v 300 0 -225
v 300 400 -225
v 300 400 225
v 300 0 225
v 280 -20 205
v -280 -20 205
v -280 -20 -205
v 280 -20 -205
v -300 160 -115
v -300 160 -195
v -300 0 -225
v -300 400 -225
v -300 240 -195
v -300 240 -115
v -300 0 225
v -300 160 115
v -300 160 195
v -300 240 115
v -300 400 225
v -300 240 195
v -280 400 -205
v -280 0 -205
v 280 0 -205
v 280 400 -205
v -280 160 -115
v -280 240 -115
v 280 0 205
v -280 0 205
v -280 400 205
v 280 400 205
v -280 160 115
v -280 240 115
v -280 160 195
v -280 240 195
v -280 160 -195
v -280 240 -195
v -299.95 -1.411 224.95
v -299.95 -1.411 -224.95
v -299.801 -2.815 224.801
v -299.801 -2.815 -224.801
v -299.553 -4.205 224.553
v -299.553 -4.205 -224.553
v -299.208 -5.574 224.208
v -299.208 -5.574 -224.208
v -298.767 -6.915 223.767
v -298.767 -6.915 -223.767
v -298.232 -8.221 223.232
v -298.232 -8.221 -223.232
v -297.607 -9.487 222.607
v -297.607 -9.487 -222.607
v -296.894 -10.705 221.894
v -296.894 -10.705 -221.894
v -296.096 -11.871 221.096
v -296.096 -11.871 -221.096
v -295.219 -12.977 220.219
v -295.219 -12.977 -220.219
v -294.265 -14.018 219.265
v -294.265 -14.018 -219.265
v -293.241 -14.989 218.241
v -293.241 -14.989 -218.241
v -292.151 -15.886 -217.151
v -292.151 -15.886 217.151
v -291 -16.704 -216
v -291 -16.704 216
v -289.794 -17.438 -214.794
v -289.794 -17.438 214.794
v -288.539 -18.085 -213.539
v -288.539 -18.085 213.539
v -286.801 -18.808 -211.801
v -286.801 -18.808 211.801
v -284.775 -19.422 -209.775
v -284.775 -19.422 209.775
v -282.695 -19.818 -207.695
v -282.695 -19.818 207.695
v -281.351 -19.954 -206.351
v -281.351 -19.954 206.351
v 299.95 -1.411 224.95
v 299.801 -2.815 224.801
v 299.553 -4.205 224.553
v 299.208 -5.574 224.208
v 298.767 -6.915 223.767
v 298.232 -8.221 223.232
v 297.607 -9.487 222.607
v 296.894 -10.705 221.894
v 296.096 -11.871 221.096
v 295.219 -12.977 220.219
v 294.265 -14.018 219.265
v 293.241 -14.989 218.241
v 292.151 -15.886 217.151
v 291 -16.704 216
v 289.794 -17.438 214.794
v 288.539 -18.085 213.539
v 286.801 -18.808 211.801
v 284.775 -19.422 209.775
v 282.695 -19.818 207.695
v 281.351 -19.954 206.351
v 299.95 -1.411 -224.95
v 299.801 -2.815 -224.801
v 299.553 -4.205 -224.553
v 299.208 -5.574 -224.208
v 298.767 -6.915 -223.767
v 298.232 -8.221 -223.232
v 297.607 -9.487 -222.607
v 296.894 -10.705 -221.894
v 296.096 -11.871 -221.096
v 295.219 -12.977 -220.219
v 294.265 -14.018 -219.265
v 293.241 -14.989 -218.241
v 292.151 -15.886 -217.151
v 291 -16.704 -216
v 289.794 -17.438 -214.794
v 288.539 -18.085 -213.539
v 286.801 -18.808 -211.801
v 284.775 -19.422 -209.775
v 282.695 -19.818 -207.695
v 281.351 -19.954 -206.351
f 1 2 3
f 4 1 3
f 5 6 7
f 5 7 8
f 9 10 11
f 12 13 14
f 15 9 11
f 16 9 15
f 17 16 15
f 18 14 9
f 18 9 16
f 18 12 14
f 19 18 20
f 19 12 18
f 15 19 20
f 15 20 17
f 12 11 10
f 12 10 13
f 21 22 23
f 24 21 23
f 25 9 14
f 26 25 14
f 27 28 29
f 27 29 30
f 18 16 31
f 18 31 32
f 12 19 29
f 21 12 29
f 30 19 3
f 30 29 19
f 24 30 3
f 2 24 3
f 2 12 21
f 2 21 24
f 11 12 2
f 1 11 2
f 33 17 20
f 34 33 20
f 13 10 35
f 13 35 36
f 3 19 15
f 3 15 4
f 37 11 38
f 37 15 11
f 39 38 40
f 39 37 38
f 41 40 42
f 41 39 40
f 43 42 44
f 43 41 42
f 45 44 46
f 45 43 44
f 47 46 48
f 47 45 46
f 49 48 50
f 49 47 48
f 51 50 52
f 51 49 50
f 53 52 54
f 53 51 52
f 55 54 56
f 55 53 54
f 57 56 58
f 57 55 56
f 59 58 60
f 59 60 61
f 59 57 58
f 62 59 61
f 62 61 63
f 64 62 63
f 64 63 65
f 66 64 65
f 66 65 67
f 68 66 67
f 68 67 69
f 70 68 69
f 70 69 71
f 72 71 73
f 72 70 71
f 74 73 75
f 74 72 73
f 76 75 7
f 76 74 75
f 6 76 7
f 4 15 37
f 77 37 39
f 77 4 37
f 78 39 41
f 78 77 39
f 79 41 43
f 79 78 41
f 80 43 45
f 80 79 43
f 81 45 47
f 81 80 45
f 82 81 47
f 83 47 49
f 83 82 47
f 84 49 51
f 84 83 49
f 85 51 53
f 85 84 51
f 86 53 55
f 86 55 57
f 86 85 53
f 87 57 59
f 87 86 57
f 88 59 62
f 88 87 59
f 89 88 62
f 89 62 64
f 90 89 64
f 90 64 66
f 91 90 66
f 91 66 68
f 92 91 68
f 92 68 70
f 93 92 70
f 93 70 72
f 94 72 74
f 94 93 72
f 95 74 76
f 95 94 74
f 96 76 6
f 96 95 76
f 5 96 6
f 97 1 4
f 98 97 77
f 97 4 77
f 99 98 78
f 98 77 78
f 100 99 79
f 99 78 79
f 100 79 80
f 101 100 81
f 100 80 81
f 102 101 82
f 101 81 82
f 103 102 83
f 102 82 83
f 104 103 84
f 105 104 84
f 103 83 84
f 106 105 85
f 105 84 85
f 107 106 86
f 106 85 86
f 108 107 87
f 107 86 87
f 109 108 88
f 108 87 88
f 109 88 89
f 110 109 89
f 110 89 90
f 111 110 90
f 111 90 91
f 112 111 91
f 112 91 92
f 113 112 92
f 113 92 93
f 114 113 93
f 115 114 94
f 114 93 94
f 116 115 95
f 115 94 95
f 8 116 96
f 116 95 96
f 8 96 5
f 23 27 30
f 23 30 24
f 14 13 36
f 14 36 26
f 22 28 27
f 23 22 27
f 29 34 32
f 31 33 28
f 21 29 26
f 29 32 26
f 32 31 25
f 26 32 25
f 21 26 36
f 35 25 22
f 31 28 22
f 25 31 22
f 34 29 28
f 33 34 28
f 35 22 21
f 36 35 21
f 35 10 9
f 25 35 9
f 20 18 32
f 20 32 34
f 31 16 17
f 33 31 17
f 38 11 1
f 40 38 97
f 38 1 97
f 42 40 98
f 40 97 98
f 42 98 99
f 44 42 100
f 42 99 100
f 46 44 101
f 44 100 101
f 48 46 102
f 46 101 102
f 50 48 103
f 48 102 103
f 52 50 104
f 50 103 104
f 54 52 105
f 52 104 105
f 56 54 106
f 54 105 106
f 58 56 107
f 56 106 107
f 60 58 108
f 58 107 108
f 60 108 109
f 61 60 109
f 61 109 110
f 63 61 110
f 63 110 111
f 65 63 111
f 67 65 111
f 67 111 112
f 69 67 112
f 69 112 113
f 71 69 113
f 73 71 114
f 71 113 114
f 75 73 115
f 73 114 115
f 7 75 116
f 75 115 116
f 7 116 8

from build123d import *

# Parameters (mm, degrees)
SKETCH1_W           = 600
SKETCH1_H           = 450
SKETCH1_W_2         = 560
SKETCH1_H_2         = 410
BOSS_EXTRUDE1_DEPTH = 400
SKETCH2_W           = 600
SKETCH2_H           = 450
BOSS_EXTRUDE2_DEPTH = 20
FILLET1_R           = 20
SKETCH8_W           = 80
SKETCH8_H           = 80
CUT_EXTRUDE3_DEPTH  = 20


with BuildPart() as part:
    # Sketch1 → Boss-Extrude1 (new body)
    with BuildSketch(Plane(origin=(0, 0, 0), x_dir=(1, 0, 0), z_dir=(0, 1, 0))):
        Rectangle(SKETCH1_W, SKETCH1_H)
        Rectangle(SKETCH1_W_2, SKETCH1_H_2, mode=Mode.SUBTRACT)
    extrude(amount=BOSS_EXTRUDE1_DEPTH)

    # Sketch2 → Boss-Extrude2 (add)
    with BuildSketch(Plane.XZ):
        Rectangle(SKETCH2_W, SKETCH2_H)
    extrude(amount=BOSS_EXTRUDE2_DEPTH)

    # Fillet1
    fillet1_edges = [part.edges().sort_by_distance(p)[0] for p in [
        (300, -20, 0),
        (0, -20, 225),
        (-300, -20, 0),
        (0, -20, -225),
    ]]
    fillet(fillet1_edges, radius=FILLET1_R)

    # Sketch8 → Cut-Extrude3 (cut)
    with BuildSketch(Plane.ZY.offset(300)):
        with Locations((155, 200)):
            Rectangle(SKETCH8_W, SKETCH8_H)
        with Locations((-155, 200)):
            Rectangle(SKETCH8_W, SKETCH8_H)
    extrude(amount=-CUT_EXTRUDE3_DEPTH, mode=Mode.SUBTRACT)


solid = part.part
